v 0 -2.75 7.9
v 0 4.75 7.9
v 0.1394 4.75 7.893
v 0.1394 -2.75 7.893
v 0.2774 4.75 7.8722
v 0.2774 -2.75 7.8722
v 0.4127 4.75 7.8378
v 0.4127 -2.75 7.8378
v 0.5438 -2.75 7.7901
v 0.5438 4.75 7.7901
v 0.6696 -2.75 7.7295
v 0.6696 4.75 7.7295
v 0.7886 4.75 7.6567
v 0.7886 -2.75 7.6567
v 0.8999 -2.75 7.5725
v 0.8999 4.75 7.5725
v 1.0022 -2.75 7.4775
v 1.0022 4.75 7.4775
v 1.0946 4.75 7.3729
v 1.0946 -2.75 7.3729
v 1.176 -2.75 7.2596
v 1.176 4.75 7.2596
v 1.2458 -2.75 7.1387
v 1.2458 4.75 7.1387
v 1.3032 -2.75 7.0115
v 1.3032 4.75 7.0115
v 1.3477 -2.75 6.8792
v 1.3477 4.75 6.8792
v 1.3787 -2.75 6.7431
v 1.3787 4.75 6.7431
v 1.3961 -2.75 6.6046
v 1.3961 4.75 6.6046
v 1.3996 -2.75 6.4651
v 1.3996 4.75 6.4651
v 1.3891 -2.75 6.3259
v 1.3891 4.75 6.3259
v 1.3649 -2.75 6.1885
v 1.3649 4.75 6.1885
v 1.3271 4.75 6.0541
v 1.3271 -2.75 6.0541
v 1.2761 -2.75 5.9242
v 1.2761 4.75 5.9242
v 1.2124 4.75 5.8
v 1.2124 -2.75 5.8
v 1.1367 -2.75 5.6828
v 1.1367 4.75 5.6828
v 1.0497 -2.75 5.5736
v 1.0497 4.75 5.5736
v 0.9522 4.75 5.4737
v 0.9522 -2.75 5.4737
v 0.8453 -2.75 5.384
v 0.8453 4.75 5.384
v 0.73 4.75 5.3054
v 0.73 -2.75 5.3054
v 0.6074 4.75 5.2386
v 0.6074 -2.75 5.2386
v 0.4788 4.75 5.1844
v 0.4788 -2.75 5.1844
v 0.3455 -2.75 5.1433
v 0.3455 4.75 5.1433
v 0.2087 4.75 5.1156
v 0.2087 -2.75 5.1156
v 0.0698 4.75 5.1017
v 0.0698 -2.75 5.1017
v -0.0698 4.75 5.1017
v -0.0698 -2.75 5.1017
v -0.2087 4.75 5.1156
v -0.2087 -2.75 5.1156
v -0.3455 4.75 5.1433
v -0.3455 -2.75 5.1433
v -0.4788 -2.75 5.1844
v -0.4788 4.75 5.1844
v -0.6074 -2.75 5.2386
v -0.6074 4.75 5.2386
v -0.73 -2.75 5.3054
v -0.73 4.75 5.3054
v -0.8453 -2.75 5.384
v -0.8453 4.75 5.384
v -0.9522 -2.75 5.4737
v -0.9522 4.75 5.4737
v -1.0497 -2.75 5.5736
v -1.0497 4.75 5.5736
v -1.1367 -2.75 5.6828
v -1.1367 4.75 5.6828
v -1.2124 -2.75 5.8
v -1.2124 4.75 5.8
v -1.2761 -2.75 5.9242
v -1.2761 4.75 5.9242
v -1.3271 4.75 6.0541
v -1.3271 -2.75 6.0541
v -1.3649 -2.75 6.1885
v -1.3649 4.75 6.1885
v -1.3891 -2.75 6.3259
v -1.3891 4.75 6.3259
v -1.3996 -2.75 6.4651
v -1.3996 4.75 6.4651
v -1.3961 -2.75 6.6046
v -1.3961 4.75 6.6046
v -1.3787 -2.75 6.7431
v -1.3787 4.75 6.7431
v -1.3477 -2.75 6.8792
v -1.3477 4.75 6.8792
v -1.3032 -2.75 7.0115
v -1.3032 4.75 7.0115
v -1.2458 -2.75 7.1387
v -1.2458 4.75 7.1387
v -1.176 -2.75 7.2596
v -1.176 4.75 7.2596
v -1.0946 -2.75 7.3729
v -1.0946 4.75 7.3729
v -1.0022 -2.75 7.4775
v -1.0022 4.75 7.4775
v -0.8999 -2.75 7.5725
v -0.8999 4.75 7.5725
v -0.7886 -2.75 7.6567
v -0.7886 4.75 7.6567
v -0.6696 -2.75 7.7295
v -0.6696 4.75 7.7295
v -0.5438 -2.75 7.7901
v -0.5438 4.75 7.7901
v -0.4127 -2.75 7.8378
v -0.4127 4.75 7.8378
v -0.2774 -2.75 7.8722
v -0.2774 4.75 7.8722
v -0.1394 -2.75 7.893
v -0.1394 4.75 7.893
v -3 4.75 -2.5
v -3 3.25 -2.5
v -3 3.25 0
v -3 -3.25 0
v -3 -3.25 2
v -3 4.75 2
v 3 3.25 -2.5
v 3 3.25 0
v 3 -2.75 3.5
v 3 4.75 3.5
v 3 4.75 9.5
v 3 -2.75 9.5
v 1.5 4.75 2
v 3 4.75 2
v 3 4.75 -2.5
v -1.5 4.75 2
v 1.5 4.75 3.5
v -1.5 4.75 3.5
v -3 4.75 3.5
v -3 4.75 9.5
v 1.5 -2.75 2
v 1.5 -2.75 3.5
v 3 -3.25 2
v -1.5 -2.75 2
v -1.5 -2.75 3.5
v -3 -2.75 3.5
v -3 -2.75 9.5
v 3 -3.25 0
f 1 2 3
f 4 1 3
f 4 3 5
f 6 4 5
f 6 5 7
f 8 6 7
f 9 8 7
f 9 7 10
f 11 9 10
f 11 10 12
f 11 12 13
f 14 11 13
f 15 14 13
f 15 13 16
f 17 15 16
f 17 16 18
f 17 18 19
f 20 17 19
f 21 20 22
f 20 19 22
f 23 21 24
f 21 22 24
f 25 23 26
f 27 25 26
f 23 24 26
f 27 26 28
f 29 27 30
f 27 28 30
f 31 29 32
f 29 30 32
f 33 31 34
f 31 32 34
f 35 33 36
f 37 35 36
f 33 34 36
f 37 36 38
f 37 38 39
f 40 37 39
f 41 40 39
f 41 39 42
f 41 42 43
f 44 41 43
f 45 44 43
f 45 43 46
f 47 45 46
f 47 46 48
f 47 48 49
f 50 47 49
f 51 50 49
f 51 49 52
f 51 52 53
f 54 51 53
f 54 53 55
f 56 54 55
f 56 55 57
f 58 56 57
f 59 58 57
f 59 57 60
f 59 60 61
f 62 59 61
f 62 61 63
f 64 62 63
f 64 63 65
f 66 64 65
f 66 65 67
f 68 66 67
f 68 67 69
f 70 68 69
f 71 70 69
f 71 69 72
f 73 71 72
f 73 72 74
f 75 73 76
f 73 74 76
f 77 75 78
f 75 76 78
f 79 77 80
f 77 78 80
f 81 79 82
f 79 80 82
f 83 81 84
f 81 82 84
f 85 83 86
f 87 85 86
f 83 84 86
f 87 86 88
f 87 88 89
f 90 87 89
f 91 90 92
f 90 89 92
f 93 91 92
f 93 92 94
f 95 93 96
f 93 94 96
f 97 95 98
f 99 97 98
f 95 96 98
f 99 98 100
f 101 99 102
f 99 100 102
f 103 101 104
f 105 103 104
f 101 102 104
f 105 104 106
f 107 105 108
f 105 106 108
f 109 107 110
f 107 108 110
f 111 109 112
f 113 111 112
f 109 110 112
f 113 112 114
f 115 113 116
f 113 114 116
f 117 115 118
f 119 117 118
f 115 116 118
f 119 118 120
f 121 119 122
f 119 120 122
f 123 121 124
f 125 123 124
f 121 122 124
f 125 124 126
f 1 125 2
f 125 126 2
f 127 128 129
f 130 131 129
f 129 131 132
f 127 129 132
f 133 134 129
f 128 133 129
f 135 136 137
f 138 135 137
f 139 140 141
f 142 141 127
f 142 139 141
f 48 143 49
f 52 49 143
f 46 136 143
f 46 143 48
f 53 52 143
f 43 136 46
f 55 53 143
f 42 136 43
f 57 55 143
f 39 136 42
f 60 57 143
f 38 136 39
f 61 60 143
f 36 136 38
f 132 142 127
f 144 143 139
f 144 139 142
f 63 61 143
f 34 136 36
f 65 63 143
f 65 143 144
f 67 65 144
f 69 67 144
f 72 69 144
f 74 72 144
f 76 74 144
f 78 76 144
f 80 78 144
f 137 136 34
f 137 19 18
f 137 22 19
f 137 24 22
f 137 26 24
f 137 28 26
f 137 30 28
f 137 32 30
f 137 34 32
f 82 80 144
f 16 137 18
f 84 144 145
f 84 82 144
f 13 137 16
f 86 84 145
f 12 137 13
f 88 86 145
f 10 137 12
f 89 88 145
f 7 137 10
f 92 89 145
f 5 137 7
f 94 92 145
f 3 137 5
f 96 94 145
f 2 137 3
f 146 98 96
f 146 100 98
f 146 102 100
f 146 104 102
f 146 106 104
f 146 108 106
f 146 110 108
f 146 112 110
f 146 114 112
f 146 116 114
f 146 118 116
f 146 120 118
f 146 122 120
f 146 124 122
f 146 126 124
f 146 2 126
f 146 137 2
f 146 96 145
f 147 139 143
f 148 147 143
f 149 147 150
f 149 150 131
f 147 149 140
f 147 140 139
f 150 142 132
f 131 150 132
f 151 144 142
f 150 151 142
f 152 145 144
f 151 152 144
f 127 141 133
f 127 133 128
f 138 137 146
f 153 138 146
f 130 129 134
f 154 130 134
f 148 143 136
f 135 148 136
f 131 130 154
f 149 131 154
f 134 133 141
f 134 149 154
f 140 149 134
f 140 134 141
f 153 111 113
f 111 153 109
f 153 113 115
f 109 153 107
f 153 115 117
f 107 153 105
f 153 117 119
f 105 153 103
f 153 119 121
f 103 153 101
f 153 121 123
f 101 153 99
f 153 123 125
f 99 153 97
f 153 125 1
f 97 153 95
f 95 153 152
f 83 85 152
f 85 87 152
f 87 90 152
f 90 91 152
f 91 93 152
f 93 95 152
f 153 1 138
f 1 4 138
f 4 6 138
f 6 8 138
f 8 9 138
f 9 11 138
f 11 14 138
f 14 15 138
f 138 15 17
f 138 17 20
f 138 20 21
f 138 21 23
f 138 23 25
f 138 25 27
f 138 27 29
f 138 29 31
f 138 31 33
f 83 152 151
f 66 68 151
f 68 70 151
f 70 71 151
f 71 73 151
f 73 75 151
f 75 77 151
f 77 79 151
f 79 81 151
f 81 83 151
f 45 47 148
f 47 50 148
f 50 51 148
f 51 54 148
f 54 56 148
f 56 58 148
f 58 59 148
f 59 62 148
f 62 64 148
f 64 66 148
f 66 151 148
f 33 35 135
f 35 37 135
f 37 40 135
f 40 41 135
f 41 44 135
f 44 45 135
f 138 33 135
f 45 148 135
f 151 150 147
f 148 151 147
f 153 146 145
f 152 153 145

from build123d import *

# Parameters (mm, degrees)
SKETCH3_W           = 6
SKETCH3_H           = 6.5
BOSS_EXTRUDE3_DEPTH = 2
SKETCH4_W           = 3
SKETCH4_H           = 1.5
BOSS_EXTRUDE4_DEPTH = 6
SKETCH5_W           = 6
SKETCH5_H           = 6
SKETCH5_R           = 1.4
BOSS_EXTRUDE5_DEPTH = 6
BOSS_EXTRUDE6_START = 1.5
SKETCH9_R           = 1.4
BOSS_EXTRUDE6_DEPTH = 1.5
SKETCH10_W          = 6
SKETCH10_H          = 1.5
BOSS_EXTRUDE7_DEPTH = 2.5


with BuildPart() as part:
    # Sketch3 → Boss-Extrude3 (new body)
    with BuildSketch(Plane.XY):
        Rectangle(SKETCH3_W, SKETCH3_H)
    extrude(amount=BOSS_EXTRUDE3_DEPTH)

    # Sketch4 → Boss-Extrude4 (add)
    with BuildSketch(Plane(origin=(0, 3.25, 0), x_dir=(1, 0, 0), z_dir=(0, 1, 0))):
        with Locations((0, -2.75)):
            Rectangle(SKETCH4_W, SKETCH4_H)
    extrude(amount=-BOSS_EXTRUDE4_DEPTH)

    # Sketch5 → Boss-Extrude5 (add)
    with BuildSketch(Plane(origin=(0, 3.25, 0), x_dir=(1, 0, 0), z_dir=(0, 1, 0))):
        with Locations((0, -6.5)):
            Rectangle(SKETCH5_W, SKETCH5_H)
        with Locations(Location((0, -6.5, 0), (0, 0, 270))):
            Circle(SKETCH5_R, mode=Mode.SUBTRACT)
    extrude(amount=-BOSS_EXTRUDE5_DEPTH)

    # Sketch9 → Boss-Extrude6 (add)
    with BuildSketch(Plane(origin=(0, 3.25, 0), x_dir=(1, 0, 0), z_dir=(0, 1, 0)).offset(BOSS_EXTRUDE6_START)):
        Polygon((3, -9.5), (-3, -9.5), (-3, -3.5), (-1.5, -3.5), (-1.5, -2), (-3, -2), (-3, 0), (3, 0), (3, -2), (1.5, -2), (1.5, -3.5), (3, -3.5), align=None)
        with Locations(Location((0, -6.5, 0), (0, 0, 270))):
            Circle(SKETCH9_R, mode=Mode.SUBTRACT)
    extrude(amount=-BOSS_EXTRUDE6_DEPTH)

    # Sketch10 → Boss-Extrude7 (add)
    with BuildSketch(Plane(origin=(0, 0, 0), x_dir=(-1, 0, 0), z_dir=(0, 0, -1))):
        with Locations((0, 4)):
            Rectangle(SKETCH10_W, SKETCH10_H)
    extrude(amount=BOSS_EXTRUDE7_DEPTH)


solid = part.part
